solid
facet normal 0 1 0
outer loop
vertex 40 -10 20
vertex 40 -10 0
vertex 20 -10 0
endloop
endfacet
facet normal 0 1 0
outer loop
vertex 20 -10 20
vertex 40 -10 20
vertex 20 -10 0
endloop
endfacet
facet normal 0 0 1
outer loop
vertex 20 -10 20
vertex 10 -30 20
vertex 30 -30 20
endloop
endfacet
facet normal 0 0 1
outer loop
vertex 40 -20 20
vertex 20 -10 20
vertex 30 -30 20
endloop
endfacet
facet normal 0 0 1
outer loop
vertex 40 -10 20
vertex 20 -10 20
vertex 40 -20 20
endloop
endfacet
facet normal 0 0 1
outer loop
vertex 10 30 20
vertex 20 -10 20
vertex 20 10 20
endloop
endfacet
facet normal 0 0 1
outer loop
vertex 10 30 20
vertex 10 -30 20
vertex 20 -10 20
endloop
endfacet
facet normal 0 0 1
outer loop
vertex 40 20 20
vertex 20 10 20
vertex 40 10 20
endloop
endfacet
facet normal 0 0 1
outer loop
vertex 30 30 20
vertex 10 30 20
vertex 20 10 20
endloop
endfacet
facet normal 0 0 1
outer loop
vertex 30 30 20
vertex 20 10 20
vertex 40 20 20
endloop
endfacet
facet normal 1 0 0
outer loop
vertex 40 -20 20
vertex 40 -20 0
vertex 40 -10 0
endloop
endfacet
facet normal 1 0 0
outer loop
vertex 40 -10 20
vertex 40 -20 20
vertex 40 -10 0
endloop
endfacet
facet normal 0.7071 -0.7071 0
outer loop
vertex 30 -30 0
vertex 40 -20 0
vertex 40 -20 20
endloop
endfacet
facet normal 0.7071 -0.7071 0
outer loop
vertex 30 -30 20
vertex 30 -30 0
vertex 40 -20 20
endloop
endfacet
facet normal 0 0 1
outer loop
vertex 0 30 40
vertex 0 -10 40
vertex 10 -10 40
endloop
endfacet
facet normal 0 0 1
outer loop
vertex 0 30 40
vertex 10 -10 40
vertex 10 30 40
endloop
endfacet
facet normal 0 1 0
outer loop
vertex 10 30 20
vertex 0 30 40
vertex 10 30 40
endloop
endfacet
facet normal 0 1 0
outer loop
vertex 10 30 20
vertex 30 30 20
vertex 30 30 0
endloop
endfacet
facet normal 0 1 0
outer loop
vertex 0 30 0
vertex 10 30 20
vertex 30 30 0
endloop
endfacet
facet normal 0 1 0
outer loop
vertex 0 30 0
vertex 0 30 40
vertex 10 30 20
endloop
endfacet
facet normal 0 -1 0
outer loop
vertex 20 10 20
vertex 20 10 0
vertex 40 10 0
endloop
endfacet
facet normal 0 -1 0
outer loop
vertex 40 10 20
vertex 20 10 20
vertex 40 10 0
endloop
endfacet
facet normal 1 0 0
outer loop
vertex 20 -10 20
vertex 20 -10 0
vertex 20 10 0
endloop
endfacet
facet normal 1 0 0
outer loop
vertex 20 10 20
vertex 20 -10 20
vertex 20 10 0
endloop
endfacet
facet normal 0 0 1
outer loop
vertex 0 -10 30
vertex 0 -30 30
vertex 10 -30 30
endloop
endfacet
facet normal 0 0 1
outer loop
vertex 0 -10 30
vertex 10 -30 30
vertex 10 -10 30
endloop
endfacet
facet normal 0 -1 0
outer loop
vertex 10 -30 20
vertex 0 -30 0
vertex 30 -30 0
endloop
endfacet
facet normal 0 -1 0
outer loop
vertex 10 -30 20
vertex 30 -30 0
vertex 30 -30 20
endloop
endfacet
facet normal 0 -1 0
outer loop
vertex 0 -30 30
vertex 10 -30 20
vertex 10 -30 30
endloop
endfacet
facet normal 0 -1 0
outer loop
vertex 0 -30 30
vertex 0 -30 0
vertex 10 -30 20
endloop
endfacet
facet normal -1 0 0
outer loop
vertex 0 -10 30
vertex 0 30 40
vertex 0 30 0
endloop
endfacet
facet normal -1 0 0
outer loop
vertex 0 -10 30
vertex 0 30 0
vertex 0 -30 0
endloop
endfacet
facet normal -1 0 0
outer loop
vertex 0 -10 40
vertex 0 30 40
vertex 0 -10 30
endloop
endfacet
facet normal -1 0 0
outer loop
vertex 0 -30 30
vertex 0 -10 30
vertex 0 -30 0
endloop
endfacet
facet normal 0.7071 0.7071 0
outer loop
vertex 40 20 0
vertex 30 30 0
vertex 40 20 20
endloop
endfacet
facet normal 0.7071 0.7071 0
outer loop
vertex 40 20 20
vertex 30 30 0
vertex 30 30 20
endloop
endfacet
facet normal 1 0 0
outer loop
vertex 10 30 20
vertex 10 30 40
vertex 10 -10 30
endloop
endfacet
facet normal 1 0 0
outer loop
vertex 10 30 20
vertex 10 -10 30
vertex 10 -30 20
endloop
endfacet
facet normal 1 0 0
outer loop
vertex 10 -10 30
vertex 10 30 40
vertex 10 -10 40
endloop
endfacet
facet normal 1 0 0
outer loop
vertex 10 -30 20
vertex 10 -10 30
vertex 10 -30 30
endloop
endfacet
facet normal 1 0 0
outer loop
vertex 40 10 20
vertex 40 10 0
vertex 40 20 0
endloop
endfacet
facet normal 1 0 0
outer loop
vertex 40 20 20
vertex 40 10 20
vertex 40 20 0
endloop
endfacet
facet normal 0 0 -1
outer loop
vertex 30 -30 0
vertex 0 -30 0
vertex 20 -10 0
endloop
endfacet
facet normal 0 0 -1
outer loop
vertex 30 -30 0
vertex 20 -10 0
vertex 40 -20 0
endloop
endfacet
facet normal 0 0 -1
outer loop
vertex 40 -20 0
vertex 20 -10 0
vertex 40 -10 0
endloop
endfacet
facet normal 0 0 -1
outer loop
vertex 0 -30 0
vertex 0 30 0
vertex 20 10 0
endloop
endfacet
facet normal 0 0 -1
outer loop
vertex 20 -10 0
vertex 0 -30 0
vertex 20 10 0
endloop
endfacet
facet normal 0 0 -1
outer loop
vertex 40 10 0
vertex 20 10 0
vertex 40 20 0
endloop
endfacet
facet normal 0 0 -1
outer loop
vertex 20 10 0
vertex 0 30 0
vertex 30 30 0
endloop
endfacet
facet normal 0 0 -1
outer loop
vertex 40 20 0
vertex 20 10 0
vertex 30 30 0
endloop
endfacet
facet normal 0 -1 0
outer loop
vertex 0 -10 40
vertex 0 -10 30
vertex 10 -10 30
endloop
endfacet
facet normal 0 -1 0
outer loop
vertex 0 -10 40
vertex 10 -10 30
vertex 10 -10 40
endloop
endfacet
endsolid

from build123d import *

# Parameters (mm, degrees)
F1_DEPTH = 20
F2_SIZE  = 10
F4_DEPTH = 10


with BuildPart() as f1:
    # F0 (on Top) → F1 (new body)
    with BuildSketch(Plane.XY):
        Polygon((0, 30), (0, -30), (40, -30), (40, -10), (20, -10), (20, 10), (40, 10), (40, 30), align=None)
    extrude(amount=F1_DEPTH)

    # F2
    f2_edges = [f1.edges().sort_by_distance(p)[0] for p in [
        (40, -30, 10),
        (40, 30, 10),
    ]]
    chamfer(f2_edges, length=F2_SIZE)

    # F3 (on face) → F4 (join)
    with BuildSketch(Plane(origin=(0, 0, 0), x_dir=(0, -1, 0), z_dir=(-1, 0, 0))):
        Polygon((-30, 40), (-30, 20), (30, 20), (30, 30), (10, 30), (10, 40), align=None)
    extrude(amount=-F4_DEPTH)


solid = f1.part
